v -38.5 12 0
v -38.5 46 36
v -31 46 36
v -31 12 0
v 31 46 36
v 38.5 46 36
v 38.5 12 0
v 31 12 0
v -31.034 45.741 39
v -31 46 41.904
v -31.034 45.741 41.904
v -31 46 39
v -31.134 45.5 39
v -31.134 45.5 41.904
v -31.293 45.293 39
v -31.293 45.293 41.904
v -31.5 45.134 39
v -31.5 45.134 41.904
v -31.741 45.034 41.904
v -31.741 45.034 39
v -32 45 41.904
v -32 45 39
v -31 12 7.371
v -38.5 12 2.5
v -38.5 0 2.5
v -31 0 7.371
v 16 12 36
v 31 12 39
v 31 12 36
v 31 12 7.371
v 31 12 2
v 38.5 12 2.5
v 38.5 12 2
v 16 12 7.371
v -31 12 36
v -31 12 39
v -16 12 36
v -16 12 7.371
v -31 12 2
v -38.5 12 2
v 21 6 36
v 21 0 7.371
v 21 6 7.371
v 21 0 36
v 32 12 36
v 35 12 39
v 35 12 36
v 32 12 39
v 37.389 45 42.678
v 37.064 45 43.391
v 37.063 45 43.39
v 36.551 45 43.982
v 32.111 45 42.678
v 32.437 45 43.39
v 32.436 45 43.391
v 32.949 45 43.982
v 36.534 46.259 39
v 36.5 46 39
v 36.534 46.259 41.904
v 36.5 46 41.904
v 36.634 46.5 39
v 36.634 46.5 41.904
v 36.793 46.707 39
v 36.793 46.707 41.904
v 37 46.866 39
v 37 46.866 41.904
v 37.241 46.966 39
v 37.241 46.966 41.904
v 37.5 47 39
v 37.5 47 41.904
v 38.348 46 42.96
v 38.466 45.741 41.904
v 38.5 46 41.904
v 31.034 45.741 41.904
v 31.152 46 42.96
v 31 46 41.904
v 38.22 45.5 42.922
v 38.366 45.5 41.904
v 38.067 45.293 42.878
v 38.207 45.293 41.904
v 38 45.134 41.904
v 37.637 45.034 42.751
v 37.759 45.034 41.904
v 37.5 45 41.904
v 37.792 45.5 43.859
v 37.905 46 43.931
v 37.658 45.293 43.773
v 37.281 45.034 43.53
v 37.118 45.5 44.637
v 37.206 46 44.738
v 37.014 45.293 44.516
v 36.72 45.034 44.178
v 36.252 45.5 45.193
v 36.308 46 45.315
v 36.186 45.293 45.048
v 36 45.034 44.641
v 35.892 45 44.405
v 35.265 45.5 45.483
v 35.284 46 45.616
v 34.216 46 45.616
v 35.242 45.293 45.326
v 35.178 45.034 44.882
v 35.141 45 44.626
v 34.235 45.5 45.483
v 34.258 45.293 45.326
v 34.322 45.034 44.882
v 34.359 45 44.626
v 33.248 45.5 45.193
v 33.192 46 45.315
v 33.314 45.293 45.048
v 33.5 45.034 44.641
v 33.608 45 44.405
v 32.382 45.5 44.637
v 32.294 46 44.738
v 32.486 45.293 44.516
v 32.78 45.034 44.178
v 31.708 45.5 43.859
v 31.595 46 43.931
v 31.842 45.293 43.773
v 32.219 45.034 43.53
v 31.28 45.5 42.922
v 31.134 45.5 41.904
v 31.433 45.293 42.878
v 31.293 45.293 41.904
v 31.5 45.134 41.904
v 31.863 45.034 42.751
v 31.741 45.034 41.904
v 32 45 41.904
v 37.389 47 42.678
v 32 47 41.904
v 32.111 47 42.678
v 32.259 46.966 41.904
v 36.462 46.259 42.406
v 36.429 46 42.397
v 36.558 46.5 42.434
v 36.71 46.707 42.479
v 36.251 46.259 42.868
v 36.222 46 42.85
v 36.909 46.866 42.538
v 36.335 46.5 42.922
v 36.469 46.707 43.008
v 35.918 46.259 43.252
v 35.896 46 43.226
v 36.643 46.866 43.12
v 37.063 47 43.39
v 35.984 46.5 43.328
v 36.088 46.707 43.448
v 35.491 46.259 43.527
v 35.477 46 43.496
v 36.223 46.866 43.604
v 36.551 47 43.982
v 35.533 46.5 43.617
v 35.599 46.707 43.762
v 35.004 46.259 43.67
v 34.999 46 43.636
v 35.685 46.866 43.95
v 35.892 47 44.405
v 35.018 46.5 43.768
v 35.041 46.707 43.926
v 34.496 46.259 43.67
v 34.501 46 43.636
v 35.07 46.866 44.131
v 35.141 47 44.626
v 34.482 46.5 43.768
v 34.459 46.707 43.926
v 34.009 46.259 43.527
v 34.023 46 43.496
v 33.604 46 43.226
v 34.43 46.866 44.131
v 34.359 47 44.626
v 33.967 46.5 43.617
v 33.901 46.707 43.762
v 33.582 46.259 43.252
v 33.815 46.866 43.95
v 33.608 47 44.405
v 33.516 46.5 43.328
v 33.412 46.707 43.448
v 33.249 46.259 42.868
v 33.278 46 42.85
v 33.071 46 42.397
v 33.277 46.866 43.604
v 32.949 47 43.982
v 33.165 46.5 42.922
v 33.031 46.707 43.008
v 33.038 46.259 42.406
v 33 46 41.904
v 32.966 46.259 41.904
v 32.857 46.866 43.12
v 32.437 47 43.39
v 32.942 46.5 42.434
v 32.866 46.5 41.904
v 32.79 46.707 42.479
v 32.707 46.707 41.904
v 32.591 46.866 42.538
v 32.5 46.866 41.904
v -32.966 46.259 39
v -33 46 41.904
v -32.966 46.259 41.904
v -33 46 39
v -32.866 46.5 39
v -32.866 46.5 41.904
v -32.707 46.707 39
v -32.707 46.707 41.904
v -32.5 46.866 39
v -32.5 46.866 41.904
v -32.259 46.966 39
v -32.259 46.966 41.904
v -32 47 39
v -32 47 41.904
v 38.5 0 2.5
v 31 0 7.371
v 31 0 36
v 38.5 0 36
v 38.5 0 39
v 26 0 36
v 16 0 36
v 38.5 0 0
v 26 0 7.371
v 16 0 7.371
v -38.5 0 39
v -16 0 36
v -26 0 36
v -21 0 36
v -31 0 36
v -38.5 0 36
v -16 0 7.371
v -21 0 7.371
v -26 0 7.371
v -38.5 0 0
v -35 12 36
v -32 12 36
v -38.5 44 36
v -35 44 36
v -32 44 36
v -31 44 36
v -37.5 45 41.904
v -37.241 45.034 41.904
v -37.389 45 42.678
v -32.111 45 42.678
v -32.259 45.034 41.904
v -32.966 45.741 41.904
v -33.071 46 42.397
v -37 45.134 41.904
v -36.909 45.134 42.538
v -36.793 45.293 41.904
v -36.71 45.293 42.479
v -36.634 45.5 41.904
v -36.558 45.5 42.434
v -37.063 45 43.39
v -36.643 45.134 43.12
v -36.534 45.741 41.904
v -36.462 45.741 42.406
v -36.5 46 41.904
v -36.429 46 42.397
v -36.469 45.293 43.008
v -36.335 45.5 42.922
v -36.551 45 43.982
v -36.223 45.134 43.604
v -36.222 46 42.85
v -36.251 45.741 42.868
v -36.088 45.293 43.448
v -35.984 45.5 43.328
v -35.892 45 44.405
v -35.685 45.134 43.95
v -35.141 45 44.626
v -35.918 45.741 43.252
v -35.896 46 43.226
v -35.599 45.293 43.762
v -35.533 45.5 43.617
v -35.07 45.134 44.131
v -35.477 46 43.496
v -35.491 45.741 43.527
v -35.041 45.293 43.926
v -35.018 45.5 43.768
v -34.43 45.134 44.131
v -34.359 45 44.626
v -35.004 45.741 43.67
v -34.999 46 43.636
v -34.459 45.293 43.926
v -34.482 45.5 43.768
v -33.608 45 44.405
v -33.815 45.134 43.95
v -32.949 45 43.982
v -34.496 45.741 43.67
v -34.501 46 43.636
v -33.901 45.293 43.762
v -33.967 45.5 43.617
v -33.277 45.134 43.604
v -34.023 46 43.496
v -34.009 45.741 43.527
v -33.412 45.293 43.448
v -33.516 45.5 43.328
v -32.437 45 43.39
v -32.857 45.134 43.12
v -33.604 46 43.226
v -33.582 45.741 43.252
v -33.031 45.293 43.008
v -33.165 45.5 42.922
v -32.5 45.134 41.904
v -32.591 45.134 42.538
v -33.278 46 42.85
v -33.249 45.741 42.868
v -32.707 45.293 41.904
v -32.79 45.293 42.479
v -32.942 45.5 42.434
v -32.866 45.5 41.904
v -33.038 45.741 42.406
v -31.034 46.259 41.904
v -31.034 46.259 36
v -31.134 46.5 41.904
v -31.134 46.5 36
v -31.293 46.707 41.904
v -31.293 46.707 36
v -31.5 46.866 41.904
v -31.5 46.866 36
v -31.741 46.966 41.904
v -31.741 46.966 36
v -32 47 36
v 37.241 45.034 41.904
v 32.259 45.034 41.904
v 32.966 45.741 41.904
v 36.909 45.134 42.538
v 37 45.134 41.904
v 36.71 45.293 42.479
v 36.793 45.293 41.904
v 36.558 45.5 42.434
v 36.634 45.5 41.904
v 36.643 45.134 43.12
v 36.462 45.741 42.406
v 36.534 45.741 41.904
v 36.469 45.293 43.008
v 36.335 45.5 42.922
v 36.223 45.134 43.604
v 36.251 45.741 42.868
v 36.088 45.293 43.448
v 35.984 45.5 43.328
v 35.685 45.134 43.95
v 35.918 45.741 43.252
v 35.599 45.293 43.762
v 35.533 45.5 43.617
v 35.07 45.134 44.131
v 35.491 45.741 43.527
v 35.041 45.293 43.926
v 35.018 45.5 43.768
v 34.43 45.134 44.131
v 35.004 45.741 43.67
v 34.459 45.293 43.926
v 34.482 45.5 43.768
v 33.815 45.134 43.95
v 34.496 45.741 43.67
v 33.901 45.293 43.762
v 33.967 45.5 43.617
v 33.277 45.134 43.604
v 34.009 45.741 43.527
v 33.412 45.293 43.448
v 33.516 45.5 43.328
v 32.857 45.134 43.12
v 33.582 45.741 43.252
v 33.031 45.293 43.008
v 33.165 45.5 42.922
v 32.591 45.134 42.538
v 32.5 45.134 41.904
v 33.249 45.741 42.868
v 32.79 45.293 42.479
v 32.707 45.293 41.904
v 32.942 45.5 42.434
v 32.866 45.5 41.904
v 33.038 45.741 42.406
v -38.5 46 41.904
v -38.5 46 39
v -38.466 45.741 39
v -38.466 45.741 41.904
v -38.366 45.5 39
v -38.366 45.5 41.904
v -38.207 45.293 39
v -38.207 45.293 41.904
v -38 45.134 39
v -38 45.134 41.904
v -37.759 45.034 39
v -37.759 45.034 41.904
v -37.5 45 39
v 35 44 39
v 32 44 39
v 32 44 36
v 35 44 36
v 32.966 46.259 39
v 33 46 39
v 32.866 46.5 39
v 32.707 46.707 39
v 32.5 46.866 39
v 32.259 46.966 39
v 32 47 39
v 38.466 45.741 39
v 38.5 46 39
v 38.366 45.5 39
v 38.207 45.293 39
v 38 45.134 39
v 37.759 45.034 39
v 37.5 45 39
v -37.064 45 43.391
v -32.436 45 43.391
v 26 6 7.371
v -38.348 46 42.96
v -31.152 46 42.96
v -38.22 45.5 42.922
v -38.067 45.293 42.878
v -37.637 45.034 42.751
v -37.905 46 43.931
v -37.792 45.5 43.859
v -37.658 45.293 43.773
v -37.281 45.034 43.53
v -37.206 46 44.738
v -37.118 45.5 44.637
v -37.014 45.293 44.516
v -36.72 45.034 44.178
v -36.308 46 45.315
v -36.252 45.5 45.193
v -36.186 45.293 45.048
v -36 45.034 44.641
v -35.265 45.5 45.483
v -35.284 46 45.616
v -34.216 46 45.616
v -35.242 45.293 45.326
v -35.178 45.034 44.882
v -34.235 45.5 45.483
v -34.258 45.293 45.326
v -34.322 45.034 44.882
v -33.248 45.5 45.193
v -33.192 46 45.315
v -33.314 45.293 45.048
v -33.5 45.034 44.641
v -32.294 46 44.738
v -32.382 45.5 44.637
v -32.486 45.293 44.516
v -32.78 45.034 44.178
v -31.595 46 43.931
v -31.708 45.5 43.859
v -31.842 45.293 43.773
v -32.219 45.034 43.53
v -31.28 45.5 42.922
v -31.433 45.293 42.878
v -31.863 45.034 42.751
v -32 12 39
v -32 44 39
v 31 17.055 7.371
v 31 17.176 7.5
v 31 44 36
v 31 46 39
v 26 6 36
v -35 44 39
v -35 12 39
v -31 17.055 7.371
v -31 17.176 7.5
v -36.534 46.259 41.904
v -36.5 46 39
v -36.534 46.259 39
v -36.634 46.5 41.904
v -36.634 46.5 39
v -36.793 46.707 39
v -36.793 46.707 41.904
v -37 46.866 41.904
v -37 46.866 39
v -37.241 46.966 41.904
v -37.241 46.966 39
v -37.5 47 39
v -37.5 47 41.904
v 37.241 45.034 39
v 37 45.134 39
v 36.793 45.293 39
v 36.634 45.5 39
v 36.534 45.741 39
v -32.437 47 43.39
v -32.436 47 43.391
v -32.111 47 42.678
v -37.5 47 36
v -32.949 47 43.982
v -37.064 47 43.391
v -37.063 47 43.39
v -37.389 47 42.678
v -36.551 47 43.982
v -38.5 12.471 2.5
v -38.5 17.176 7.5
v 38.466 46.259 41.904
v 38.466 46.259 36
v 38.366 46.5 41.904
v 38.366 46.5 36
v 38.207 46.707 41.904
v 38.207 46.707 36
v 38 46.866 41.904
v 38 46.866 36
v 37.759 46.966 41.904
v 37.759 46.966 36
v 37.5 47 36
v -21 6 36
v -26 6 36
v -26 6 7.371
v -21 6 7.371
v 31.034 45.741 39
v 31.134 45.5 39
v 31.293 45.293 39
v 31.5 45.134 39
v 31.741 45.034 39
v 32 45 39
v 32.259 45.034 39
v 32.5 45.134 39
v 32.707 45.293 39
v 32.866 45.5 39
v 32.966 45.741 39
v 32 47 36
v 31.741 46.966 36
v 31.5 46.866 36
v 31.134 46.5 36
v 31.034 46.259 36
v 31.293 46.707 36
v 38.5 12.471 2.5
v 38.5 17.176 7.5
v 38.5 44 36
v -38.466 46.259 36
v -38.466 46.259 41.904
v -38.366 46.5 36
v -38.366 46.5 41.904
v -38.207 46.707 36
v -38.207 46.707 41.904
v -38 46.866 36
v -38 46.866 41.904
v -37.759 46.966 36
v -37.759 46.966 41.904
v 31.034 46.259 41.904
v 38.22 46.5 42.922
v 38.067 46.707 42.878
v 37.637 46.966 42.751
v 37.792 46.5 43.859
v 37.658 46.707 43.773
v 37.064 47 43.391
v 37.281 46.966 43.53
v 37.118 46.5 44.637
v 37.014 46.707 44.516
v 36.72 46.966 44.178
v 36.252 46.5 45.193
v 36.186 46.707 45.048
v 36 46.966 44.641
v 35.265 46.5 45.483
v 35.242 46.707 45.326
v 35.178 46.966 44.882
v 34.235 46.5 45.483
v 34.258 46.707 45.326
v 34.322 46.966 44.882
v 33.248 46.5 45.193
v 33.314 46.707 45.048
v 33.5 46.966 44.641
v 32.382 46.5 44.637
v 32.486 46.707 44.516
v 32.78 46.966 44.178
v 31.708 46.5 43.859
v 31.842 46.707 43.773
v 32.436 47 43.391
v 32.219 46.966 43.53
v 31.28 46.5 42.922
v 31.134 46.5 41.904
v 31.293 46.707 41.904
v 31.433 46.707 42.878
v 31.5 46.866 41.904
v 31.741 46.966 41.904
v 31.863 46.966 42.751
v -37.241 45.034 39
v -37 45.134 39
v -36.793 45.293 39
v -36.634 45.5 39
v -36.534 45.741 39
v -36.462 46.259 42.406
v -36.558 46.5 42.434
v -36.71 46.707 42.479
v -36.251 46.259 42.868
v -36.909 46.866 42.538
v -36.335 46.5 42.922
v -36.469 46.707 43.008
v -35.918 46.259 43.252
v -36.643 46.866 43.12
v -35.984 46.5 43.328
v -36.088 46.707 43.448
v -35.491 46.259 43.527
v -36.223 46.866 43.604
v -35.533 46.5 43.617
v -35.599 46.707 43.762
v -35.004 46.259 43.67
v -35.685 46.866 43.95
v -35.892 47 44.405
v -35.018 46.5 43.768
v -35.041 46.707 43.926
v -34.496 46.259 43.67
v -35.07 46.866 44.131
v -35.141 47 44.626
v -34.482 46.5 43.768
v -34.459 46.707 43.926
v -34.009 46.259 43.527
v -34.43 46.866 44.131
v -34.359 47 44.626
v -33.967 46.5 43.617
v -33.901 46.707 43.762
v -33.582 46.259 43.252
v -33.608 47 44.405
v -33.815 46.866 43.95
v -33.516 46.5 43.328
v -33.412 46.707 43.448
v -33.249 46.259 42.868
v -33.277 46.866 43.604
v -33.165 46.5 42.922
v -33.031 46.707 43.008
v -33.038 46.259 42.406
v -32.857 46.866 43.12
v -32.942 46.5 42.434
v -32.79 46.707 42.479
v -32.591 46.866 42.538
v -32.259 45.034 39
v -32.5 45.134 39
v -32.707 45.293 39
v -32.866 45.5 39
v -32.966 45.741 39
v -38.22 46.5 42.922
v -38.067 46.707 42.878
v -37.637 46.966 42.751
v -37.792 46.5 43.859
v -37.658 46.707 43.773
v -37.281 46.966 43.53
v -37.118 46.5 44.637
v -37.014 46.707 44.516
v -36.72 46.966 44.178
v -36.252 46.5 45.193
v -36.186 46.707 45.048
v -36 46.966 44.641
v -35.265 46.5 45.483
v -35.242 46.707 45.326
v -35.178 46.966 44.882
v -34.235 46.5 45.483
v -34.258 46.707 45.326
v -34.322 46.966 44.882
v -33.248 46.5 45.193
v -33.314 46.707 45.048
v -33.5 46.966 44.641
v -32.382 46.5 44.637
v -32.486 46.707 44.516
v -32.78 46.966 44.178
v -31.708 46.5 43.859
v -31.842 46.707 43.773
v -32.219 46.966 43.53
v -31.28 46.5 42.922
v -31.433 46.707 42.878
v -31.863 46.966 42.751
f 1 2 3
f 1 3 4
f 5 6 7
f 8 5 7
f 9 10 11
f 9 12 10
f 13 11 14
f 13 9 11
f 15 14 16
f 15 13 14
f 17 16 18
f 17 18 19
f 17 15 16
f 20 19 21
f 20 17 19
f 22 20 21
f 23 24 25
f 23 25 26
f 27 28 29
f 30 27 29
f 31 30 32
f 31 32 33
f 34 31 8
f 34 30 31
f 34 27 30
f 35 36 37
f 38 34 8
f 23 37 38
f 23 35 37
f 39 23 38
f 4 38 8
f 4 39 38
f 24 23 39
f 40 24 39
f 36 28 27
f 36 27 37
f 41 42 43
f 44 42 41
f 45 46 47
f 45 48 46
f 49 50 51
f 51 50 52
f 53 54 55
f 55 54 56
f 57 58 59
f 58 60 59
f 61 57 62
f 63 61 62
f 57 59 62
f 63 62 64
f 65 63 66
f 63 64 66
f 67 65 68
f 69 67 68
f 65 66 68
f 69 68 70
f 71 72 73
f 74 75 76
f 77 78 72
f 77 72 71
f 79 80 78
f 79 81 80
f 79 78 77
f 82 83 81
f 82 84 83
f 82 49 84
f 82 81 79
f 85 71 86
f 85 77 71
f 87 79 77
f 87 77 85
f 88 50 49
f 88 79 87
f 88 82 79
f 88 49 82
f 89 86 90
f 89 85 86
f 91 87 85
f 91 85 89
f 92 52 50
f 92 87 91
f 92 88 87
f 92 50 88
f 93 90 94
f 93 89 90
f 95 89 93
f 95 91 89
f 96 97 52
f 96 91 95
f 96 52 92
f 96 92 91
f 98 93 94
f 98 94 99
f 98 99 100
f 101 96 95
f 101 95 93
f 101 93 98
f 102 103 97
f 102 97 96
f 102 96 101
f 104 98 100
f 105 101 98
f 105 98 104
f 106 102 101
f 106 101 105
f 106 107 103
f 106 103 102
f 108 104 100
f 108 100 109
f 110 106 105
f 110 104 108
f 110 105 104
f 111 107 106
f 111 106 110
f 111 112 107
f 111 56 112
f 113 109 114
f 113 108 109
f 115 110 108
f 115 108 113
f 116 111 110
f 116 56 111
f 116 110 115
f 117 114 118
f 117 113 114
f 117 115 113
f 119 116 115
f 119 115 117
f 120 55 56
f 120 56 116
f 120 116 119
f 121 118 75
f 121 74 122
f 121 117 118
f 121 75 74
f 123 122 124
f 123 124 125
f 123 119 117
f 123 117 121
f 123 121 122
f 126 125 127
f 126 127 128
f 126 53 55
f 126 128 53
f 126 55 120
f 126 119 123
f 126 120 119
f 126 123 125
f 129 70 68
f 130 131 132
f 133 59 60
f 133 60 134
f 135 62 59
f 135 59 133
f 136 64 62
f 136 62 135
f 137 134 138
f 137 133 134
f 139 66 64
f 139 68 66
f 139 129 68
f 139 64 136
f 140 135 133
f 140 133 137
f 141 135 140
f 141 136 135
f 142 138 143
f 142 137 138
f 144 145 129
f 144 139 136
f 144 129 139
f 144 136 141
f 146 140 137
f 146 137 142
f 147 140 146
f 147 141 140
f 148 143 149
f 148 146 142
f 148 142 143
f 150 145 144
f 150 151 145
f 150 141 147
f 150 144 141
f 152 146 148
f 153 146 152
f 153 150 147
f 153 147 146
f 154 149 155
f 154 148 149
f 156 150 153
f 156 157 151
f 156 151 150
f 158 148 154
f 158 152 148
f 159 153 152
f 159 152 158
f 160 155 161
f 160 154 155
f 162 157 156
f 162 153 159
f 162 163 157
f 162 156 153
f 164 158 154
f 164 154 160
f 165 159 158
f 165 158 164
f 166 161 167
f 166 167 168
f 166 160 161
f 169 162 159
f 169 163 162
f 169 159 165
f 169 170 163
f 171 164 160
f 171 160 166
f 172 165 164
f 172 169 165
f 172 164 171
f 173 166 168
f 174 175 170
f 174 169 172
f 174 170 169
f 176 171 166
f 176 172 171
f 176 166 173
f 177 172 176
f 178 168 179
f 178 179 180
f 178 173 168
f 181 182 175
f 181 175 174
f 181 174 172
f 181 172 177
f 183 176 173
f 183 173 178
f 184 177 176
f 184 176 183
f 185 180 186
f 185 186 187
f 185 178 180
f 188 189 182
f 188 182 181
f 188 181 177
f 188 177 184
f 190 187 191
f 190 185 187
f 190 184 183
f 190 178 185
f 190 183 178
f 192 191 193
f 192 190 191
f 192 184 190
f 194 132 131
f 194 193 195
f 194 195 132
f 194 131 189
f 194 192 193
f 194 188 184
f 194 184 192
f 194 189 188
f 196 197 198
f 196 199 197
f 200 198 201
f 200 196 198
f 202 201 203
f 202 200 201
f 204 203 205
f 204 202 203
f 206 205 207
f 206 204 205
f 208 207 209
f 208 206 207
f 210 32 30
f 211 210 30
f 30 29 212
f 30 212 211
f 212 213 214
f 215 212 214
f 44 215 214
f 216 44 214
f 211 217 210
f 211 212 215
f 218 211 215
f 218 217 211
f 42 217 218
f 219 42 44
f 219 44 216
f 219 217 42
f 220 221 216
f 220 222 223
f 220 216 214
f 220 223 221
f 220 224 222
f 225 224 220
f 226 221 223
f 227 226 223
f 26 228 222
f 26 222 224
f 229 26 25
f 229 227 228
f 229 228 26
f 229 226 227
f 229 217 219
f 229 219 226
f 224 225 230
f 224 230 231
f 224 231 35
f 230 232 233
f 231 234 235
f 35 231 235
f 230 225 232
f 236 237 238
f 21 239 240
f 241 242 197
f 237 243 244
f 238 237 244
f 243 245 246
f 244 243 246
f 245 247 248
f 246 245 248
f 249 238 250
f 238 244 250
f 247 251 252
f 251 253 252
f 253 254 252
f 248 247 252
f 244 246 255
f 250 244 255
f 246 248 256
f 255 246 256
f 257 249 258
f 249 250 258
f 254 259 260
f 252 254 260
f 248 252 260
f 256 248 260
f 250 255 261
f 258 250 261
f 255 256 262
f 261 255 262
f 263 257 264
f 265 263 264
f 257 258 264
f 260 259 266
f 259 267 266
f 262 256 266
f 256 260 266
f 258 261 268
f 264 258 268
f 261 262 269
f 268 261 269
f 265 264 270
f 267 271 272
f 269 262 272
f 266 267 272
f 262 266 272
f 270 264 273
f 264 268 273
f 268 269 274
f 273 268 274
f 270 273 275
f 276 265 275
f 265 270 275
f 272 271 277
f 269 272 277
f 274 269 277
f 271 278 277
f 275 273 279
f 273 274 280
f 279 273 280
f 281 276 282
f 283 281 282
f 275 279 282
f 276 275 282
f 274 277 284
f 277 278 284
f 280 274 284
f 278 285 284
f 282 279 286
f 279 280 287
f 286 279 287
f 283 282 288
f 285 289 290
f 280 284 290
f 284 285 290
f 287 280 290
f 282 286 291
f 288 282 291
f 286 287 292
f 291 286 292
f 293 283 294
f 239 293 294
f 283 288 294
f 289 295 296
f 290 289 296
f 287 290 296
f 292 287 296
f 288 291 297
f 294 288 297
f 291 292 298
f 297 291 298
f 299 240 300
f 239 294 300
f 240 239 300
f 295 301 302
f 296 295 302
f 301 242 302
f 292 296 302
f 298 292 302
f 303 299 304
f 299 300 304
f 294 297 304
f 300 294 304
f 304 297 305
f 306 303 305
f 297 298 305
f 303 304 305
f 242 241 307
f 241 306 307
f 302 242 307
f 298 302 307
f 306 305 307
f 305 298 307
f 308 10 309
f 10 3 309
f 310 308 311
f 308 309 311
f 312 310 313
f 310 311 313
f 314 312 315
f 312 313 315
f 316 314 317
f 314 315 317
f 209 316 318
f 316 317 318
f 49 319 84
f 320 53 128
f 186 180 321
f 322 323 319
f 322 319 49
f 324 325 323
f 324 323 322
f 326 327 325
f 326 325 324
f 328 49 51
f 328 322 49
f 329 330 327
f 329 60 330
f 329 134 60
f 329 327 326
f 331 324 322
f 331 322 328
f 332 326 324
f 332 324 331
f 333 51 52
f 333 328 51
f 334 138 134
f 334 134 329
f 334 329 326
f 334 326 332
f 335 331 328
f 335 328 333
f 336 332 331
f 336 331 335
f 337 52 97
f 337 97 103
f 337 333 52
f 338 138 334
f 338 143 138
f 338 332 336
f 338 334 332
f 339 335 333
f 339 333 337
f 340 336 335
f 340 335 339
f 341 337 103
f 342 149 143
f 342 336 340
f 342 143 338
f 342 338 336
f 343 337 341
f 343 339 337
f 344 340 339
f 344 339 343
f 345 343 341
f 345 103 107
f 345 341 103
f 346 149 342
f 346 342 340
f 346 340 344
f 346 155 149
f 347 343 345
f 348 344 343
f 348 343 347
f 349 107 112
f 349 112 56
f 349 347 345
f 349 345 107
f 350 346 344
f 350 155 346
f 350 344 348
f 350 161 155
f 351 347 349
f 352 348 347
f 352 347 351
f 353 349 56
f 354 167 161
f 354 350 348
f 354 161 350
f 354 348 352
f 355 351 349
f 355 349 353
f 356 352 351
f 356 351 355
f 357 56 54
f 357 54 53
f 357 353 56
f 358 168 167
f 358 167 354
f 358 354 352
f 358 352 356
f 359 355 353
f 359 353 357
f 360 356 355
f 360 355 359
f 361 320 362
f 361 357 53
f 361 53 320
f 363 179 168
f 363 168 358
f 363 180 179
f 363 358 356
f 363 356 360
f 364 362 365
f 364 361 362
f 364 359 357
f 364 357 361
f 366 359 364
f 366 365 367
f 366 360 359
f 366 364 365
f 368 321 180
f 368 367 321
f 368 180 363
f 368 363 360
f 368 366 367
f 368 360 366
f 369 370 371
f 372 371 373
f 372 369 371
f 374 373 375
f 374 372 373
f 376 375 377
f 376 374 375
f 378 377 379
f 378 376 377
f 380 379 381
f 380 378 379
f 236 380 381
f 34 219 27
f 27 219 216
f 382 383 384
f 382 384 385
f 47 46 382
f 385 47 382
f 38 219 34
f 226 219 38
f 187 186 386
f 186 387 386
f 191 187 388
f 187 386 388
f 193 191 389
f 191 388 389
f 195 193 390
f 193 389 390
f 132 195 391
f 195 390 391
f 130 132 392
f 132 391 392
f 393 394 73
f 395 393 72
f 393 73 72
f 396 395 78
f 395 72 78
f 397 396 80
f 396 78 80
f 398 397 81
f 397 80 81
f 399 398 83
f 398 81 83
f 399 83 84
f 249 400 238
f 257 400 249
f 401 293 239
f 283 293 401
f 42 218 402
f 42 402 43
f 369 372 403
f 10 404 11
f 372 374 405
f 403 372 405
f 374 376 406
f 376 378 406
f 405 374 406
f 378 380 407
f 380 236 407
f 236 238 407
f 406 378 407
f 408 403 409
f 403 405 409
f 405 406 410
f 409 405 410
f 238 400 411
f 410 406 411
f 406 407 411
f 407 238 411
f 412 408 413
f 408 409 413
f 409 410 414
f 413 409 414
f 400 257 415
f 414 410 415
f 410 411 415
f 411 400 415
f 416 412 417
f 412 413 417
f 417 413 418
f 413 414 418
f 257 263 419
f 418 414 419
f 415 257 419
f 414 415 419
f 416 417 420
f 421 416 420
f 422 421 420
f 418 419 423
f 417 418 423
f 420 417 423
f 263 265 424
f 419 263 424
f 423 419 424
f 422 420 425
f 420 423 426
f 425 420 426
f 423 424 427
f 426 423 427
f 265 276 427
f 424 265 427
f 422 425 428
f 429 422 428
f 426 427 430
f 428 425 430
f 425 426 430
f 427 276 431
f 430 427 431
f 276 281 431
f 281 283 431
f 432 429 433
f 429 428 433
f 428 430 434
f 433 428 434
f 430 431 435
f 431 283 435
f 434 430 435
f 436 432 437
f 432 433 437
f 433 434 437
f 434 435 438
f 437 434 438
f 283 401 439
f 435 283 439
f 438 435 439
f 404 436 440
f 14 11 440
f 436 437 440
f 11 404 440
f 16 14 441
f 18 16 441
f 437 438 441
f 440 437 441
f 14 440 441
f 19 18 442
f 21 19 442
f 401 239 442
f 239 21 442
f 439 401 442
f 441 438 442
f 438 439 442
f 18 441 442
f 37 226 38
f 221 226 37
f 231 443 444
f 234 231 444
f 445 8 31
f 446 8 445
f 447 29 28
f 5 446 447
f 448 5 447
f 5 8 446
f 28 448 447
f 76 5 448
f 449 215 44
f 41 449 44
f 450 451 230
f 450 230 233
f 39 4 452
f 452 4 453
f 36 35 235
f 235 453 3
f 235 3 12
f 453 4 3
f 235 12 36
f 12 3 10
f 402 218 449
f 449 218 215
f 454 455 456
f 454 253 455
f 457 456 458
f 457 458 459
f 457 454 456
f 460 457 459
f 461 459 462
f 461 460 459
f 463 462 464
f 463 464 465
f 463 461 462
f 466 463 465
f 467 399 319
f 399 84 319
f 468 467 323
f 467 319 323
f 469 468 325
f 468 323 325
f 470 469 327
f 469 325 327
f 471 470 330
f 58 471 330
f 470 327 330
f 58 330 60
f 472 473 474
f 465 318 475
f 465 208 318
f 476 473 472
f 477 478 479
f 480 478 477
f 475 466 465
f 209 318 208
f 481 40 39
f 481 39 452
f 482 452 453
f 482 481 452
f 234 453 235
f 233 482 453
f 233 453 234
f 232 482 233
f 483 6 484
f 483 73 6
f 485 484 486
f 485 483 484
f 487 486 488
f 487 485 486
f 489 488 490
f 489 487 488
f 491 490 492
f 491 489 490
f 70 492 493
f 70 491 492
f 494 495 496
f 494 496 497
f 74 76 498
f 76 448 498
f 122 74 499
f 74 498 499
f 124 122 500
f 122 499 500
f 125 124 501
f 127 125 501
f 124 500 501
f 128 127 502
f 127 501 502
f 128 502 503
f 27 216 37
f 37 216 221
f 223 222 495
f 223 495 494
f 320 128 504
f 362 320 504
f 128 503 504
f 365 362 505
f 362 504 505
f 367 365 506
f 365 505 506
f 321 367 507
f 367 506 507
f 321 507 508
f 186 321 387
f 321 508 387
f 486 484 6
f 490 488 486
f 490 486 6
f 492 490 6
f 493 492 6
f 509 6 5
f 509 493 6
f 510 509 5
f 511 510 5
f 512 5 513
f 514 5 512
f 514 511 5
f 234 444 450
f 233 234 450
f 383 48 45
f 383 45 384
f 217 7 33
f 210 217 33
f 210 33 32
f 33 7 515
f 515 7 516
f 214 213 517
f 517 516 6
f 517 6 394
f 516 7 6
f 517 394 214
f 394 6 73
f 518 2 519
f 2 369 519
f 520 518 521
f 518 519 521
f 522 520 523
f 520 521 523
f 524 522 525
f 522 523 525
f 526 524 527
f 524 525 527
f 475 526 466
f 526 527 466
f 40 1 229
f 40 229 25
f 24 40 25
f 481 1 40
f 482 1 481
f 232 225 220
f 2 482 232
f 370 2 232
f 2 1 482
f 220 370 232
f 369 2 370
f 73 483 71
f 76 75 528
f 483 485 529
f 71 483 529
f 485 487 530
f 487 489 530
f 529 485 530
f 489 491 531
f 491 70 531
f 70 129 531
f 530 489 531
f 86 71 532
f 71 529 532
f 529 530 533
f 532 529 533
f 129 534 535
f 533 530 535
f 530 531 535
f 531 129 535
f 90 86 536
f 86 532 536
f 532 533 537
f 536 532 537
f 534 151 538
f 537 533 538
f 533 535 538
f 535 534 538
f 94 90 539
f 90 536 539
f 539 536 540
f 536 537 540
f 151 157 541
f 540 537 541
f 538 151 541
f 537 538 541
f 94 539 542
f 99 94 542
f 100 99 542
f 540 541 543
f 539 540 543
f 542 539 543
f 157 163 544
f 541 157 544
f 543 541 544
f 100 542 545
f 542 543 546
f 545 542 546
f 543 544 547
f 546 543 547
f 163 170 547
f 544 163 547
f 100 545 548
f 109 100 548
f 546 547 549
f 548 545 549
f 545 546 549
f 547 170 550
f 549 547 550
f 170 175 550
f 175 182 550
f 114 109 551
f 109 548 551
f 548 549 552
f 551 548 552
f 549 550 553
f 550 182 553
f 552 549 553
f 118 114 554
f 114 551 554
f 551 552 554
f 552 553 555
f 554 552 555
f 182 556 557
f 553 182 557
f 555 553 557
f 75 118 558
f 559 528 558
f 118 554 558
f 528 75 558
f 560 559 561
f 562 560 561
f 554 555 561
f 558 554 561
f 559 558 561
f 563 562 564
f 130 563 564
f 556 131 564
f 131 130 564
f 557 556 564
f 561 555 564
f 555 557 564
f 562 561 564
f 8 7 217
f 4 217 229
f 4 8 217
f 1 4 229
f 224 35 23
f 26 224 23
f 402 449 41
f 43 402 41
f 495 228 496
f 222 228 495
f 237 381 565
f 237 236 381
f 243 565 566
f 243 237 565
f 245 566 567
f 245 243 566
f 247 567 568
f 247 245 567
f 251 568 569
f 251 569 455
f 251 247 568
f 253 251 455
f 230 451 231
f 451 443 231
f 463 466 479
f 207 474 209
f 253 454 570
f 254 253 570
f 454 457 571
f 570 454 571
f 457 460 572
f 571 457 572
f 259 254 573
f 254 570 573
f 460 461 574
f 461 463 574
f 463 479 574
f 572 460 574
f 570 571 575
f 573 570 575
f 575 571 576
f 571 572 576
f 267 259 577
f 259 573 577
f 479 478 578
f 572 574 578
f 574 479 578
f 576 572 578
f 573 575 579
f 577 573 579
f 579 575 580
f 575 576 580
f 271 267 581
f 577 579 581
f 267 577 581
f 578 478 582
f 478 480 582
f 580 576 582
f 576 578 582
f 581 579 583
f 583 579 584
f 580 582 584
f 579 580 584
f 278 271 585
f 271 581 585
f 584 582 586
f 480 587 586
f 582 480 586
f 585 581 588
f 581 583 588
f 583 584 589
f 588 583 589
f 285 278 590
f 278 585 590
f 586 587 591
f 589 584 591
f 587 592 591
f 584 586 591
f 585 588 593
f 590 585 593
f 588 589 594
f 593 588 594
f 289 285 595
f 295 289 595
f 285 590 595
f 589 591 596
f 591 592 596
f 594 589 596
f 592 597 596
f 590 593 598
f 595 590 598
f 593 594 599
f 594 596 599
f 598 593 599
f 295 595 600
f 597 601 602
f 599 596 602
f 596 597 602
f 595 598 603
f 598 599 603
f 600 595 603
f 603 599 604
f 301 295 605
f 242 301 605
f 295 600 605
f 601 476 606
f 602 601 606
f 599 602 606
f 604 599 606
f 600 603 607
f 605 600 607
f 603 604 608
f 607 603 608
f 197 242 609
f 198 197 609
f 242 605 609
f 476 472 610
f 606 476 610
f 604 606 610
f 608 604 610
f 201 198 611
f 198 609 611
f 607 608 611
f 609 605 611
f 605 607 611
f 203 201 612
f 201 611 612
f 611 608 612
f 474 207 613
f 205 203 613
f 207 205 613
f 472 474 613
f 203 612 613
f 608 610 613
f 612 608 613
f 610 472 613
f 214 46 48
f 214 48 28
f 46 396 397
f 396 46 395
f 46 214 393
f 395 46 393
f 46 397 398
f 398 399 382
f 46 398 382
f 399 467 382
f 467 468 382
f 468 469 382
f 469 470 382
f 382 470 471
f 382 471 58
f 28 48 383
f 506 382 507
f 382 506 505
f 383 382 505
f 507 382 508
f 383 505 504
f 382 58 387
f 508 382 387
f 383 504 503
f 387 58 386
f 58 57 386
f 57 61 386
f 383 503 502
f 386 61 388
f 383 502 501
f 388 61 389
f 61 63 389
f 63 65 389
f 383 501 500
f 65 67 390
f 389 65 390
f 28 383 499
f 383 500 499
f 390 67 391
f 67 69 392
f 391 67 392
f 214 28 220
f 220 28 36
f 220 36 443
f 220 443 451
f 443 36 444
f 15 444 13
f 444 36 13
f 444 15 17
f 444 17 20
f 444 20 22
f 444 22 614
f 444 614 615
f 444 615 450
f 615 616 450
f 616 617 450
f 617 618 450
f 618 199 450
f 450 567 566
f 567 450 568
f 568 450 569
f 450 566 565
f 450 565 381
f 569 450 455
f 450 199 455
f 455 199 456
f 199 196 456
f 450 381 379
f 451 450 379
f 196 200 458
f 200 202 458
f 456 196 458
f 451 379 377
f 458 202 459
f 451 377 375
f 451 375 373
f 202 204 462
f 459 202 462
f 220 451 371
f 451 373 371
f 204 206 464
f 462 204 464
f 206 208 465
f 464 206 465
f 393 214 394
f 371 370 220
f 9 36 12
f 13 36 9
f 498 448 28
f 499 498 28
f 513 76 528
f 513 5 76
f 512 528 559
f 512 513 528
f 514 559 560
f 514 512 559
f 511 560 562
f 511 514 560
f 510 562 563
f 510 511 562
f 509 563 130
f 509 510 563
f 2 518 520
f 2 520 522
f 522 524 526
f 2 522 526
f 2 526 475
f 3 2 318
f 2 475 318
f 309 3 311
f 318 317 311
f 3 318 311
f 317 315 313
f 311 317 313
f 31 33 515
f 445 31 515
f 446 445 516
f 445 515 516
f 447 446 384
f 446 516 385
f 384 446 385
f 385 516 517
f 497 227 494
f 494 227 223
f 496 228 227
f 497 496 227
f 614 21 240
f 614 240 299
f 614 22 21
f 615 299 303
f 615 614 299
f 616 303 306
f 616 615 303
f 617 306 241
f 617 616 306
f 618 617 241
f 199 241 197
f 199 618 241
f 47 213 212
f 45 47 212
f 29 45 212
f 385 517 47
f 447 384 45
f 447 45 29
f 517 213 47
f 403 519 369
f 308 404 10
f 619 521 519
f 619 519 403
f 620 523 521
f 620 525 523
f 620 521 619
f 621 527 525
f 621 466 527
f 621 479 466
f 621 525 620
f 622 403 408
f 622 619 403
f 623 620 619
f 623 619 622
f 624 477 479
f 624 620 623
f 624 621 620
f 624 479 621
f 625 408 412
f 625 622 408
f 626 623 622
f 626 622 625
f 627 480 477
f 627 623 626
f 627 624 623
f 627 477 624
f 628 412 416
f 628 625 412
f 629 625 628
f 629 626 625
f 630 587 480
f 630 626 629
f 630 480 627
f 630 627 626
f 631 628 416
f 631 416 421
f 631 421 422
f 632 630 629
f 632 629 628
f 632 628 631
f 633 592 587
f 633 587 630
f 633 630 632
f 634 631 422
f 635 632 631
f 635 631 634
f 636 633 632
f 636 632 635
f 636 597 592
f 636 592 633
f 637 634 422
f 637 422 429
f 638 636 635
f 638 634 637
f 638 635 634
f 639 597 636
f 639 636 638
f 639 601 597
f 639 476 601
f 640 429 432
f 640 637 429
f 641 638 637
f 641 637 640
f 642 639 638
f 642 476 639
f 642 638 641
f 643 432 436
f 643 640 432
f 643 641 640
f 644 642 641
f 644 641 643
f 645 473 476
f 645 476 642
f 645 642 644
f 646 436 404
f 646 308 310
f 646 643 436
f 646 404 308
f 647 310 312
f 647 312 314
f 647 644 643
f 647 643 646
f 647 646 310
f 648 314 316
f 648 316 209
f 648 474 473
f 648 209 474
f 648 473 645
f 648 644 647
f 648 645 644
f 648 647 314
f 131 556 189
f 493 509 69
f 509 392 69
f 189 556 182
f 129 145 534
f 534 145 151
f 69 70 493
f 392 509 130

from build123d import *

# Parameters (mm, degrees)
BOSS_EXTRU_1_DEPTH           = 39
ESQUISSE2_W                  = 36
ESQUISSE2_H                  = 35
ENL_V_MAT_EXTRU_1_DEPTH      = 69.490875305
ENL_V_MAT_EXTRU_2_DEPTH      = 7.5
ENL_V_MAT_EXTRU_2_DEPTH_BACK = 39
ESQUISSE3_W                  = 3
ESQUISSE3_H                  = 32
ESQUISSE5_W                  = 7.5
ESQUISSE5_H                  = 28.5
ENL_V_MAT_EXTRU_3_DEPTH      = 66.024995194
ESQUISSE6_W                  = 2
ESQUISSE6_H                  = 2
CONG_2_R                     = 1
BOSS_EXTRU_3_DEPTH           = 7.5
CHANFREIN1_SIZE              = 5
CHANFREIN1_SIZE_2            = 7.699324819
ESQUISSE9_W                  = 5
ESQUISSE9_H                  = 28.629443051
ENL_V_MAT_EXTRU_4_DEPTH      = 6
ESQUISSE10_W                 = 16
ESQUISSE10_H                 = 28.629443051
ENL_V_MAT_EXTRU_6_DEPTH      = 76.996780236


# Some blends are built 0.0001 mm under size
with BuildPart() as part:
    # Esquisse1 → Boss.-Extru.1 (new body)
    with BuildSketch(Plane.XY):
        Polygon((-38.5, 0), (0, 0), (0, 12), (-31, 12), (-31, 47), (-38.5, 47), align=None)
    extrude(amount=BOSS_EXTRU_1_DEPTH)

    # Esquisse2 → Enlèv. mat.-Extru.1 (cut, through all)
    with BuildSketch(Plane(origin=(-31, 0, 0), x_dir=(0, 0, -1), z_dir=(1, 0, 0))):
        with Locations((-18, 29.5)):
            Rectangle(ESQUISSE2_W, ESQUISSE2_H)
    extrude(amount=-ENL_V_MAT_EXTRU_1_DEPTH, mode=Mode.SUBTRACT)

    # Esquisse3 → Enlèv. mat.-Extru.2 (cut, two sides: drawn at the far end of the back side and taken through both)
    with BuildSketch(Plane(origin=(0, 0, 36), x_dir=(-1, 0, 0), z_dir=(0, 0, -1)).offset(-ENL_V_MAT_EXTRU_2_DEPTH_BACK)):
        with Locations((33.5, 28)):
            Rectangle(ESQUISSE3_W, ESQUISSE3_H)
    extrude(amount=ENL_V_MAT_EXTRU_2_DEPTH + ENL_V_MAT_EXTRU_2_DEPTH_BACK, mode=Mode.SUBTRACT)

    # Esquisse5 → Enlèv. mat.-Extru.3 (cut, through all)
    with BuildSketch(Plane(origin=(0, 12, 0), x_dir=(1, 0, 0), z_dir=(0, 1, 0))):
        with Locations((-34.75, -21.75)):
            Rectangle(ESQUISSE5_W, ESQUISSE5_H)
    extrude(amount=-ENL_V_MAT_EXTRU_3_DEPTH, mode=Mode.SUBTRACT)

    # Balayage3: sweep along a path in Esquisse7
    with BuildLine(Plane(origin=(0, 47, 0), x_dir=(1, 0, 0), z_dir=(0, 1, 0))) as balayage3_path:
        Line((-37.5, -39), (-37.5, -41.903703094))
        ThreePointArc((-37.5, -41.903703094), (-34.75, -44.653703094), (-32, -41.903703094))
        Line((-32, -41.903703094), (-32, -39))
    # Esquisse6 → Balayage3 (sweep)
    with BuildSketch(Plane.XY.offset(39)):
        with Locations((-37.5, 46)):
            Rectangle(ESQUISSE6_W, ESQUISSE6_H)
    sweep(path=balayage3_path.line)

    # Congé2
    cong_2_edges = [part.edges().sort_by_distance(p)[0] for p in [
        (-31, 47, 38.951851547),
        (-38.5, 47, 38.951851547),
        (-31, 45, 40.451851547),
        (-33, 47, 40.451851547),
        (-38.5, 45, 40.451851547),
        (-36.5, 47, 40.451851547),
        (-33, 45, 40.451851547),
        (-34.75, 47, 45.653703094),
        (-34.75, 45, 45.653703094),
        (-34.75, 45, 43.653703094),
        (-34.75, 47, 43.653703094),
        (-36.5, 45, 40.451851547),
    ]]
    fillet(cong_2_edges, radius=CONG_2_R - 0.0001)  # a hair under: the kernel refuses the full size

    # Esquisse8 → Boss.-Extru.3 (add)
    with BuildSketch(Plane.ZY.offset(38.5)):
        Polygon((36, 46), (0, 12), (2, 12), (36, 44), align=None)
    extrude(amount=-BOSS_EXTRU_3_DEPTH)

    # Chanfrein1
    # the kernel refuses this chamfer: 7.699324819, 5 mm, written as the material it takes off along each edge
    with BuildSketch(Plane(origin=(-38.5, 31.898450737, 7.5), x_dir=(-0.04991856572298867, 0, -0.9987532912567346), z_dir=(0, -1, 0))) as chanfrein1_piece_1_section:
        Polygon((CHANFREIN1_SIZE * 0.998753291257, CHANFREIN1_SIZE * 0.049918565723), (-CHANFREIN1_SIZE_2 * 0.0499185657235, CHANFREIN1_SIZE_2 * 0.998753291266), (0, 0), align=None)
    chanfrein1_piece_1 = extrude(amount=51.796901474, mode=Mode.PRIVATE)
    chanfrein1_piece_1 = split(chanfrein1_piece_1, bisect_by=Plane(origin=(-31, 6, 5.832244488), z_dir=(-1, 0, 0)), keep=Keep.TOP, mode=Mode.PRIVATE)
    chanfrein1_piece_1 = split(chanfrein1_piece_1, bisect_by=Plane(origin=(-35.936911742, 11.0942578, 1.037648912), z_dir=(0, -0.7281999926928029, 0.685364699004991)), keep=Keep.TOP, mode=Mode.PRIVATE)
    add(chanfrein1_piece_1, mode=Mode.SUBTRACT)

    # Esquisse9 → Enlèv. mat.-Extru.4 (cut)
    with BuildSketch(Plane.XZ):
        with Locations((-23.5, 21.685278474)):
            Rectangle(ESQUISSE9_W, ESQUISSE9_H)
    extrude(amount=-ENL_V_MAT_EXTRU_4_DEPTH, mode=Mode.SUBTRACT)

    # Esquisse10 → Enlèv. mat.-Extru.6 (cut, through all)
    with BuildSketch(Plane.XZ):
        with Locations((-8, 21.685278474)):
            Rectangle(ESQUISSE10_W, ESQUISSE10_H)
    extrude(amount=-ENL_V_MAT_EXTRU_6_DEPTH, mode=Mode.SUBTRACT)

    # Symétrie1: part across plane


with BuildPart() as part_1:
    add(part.part)
    add(part.part.mirror(Plane(origin=(0, 12, 39), x_dir=(0, 0, 1), z_dir=(1, 0, 0))))


solid = part_1.part
